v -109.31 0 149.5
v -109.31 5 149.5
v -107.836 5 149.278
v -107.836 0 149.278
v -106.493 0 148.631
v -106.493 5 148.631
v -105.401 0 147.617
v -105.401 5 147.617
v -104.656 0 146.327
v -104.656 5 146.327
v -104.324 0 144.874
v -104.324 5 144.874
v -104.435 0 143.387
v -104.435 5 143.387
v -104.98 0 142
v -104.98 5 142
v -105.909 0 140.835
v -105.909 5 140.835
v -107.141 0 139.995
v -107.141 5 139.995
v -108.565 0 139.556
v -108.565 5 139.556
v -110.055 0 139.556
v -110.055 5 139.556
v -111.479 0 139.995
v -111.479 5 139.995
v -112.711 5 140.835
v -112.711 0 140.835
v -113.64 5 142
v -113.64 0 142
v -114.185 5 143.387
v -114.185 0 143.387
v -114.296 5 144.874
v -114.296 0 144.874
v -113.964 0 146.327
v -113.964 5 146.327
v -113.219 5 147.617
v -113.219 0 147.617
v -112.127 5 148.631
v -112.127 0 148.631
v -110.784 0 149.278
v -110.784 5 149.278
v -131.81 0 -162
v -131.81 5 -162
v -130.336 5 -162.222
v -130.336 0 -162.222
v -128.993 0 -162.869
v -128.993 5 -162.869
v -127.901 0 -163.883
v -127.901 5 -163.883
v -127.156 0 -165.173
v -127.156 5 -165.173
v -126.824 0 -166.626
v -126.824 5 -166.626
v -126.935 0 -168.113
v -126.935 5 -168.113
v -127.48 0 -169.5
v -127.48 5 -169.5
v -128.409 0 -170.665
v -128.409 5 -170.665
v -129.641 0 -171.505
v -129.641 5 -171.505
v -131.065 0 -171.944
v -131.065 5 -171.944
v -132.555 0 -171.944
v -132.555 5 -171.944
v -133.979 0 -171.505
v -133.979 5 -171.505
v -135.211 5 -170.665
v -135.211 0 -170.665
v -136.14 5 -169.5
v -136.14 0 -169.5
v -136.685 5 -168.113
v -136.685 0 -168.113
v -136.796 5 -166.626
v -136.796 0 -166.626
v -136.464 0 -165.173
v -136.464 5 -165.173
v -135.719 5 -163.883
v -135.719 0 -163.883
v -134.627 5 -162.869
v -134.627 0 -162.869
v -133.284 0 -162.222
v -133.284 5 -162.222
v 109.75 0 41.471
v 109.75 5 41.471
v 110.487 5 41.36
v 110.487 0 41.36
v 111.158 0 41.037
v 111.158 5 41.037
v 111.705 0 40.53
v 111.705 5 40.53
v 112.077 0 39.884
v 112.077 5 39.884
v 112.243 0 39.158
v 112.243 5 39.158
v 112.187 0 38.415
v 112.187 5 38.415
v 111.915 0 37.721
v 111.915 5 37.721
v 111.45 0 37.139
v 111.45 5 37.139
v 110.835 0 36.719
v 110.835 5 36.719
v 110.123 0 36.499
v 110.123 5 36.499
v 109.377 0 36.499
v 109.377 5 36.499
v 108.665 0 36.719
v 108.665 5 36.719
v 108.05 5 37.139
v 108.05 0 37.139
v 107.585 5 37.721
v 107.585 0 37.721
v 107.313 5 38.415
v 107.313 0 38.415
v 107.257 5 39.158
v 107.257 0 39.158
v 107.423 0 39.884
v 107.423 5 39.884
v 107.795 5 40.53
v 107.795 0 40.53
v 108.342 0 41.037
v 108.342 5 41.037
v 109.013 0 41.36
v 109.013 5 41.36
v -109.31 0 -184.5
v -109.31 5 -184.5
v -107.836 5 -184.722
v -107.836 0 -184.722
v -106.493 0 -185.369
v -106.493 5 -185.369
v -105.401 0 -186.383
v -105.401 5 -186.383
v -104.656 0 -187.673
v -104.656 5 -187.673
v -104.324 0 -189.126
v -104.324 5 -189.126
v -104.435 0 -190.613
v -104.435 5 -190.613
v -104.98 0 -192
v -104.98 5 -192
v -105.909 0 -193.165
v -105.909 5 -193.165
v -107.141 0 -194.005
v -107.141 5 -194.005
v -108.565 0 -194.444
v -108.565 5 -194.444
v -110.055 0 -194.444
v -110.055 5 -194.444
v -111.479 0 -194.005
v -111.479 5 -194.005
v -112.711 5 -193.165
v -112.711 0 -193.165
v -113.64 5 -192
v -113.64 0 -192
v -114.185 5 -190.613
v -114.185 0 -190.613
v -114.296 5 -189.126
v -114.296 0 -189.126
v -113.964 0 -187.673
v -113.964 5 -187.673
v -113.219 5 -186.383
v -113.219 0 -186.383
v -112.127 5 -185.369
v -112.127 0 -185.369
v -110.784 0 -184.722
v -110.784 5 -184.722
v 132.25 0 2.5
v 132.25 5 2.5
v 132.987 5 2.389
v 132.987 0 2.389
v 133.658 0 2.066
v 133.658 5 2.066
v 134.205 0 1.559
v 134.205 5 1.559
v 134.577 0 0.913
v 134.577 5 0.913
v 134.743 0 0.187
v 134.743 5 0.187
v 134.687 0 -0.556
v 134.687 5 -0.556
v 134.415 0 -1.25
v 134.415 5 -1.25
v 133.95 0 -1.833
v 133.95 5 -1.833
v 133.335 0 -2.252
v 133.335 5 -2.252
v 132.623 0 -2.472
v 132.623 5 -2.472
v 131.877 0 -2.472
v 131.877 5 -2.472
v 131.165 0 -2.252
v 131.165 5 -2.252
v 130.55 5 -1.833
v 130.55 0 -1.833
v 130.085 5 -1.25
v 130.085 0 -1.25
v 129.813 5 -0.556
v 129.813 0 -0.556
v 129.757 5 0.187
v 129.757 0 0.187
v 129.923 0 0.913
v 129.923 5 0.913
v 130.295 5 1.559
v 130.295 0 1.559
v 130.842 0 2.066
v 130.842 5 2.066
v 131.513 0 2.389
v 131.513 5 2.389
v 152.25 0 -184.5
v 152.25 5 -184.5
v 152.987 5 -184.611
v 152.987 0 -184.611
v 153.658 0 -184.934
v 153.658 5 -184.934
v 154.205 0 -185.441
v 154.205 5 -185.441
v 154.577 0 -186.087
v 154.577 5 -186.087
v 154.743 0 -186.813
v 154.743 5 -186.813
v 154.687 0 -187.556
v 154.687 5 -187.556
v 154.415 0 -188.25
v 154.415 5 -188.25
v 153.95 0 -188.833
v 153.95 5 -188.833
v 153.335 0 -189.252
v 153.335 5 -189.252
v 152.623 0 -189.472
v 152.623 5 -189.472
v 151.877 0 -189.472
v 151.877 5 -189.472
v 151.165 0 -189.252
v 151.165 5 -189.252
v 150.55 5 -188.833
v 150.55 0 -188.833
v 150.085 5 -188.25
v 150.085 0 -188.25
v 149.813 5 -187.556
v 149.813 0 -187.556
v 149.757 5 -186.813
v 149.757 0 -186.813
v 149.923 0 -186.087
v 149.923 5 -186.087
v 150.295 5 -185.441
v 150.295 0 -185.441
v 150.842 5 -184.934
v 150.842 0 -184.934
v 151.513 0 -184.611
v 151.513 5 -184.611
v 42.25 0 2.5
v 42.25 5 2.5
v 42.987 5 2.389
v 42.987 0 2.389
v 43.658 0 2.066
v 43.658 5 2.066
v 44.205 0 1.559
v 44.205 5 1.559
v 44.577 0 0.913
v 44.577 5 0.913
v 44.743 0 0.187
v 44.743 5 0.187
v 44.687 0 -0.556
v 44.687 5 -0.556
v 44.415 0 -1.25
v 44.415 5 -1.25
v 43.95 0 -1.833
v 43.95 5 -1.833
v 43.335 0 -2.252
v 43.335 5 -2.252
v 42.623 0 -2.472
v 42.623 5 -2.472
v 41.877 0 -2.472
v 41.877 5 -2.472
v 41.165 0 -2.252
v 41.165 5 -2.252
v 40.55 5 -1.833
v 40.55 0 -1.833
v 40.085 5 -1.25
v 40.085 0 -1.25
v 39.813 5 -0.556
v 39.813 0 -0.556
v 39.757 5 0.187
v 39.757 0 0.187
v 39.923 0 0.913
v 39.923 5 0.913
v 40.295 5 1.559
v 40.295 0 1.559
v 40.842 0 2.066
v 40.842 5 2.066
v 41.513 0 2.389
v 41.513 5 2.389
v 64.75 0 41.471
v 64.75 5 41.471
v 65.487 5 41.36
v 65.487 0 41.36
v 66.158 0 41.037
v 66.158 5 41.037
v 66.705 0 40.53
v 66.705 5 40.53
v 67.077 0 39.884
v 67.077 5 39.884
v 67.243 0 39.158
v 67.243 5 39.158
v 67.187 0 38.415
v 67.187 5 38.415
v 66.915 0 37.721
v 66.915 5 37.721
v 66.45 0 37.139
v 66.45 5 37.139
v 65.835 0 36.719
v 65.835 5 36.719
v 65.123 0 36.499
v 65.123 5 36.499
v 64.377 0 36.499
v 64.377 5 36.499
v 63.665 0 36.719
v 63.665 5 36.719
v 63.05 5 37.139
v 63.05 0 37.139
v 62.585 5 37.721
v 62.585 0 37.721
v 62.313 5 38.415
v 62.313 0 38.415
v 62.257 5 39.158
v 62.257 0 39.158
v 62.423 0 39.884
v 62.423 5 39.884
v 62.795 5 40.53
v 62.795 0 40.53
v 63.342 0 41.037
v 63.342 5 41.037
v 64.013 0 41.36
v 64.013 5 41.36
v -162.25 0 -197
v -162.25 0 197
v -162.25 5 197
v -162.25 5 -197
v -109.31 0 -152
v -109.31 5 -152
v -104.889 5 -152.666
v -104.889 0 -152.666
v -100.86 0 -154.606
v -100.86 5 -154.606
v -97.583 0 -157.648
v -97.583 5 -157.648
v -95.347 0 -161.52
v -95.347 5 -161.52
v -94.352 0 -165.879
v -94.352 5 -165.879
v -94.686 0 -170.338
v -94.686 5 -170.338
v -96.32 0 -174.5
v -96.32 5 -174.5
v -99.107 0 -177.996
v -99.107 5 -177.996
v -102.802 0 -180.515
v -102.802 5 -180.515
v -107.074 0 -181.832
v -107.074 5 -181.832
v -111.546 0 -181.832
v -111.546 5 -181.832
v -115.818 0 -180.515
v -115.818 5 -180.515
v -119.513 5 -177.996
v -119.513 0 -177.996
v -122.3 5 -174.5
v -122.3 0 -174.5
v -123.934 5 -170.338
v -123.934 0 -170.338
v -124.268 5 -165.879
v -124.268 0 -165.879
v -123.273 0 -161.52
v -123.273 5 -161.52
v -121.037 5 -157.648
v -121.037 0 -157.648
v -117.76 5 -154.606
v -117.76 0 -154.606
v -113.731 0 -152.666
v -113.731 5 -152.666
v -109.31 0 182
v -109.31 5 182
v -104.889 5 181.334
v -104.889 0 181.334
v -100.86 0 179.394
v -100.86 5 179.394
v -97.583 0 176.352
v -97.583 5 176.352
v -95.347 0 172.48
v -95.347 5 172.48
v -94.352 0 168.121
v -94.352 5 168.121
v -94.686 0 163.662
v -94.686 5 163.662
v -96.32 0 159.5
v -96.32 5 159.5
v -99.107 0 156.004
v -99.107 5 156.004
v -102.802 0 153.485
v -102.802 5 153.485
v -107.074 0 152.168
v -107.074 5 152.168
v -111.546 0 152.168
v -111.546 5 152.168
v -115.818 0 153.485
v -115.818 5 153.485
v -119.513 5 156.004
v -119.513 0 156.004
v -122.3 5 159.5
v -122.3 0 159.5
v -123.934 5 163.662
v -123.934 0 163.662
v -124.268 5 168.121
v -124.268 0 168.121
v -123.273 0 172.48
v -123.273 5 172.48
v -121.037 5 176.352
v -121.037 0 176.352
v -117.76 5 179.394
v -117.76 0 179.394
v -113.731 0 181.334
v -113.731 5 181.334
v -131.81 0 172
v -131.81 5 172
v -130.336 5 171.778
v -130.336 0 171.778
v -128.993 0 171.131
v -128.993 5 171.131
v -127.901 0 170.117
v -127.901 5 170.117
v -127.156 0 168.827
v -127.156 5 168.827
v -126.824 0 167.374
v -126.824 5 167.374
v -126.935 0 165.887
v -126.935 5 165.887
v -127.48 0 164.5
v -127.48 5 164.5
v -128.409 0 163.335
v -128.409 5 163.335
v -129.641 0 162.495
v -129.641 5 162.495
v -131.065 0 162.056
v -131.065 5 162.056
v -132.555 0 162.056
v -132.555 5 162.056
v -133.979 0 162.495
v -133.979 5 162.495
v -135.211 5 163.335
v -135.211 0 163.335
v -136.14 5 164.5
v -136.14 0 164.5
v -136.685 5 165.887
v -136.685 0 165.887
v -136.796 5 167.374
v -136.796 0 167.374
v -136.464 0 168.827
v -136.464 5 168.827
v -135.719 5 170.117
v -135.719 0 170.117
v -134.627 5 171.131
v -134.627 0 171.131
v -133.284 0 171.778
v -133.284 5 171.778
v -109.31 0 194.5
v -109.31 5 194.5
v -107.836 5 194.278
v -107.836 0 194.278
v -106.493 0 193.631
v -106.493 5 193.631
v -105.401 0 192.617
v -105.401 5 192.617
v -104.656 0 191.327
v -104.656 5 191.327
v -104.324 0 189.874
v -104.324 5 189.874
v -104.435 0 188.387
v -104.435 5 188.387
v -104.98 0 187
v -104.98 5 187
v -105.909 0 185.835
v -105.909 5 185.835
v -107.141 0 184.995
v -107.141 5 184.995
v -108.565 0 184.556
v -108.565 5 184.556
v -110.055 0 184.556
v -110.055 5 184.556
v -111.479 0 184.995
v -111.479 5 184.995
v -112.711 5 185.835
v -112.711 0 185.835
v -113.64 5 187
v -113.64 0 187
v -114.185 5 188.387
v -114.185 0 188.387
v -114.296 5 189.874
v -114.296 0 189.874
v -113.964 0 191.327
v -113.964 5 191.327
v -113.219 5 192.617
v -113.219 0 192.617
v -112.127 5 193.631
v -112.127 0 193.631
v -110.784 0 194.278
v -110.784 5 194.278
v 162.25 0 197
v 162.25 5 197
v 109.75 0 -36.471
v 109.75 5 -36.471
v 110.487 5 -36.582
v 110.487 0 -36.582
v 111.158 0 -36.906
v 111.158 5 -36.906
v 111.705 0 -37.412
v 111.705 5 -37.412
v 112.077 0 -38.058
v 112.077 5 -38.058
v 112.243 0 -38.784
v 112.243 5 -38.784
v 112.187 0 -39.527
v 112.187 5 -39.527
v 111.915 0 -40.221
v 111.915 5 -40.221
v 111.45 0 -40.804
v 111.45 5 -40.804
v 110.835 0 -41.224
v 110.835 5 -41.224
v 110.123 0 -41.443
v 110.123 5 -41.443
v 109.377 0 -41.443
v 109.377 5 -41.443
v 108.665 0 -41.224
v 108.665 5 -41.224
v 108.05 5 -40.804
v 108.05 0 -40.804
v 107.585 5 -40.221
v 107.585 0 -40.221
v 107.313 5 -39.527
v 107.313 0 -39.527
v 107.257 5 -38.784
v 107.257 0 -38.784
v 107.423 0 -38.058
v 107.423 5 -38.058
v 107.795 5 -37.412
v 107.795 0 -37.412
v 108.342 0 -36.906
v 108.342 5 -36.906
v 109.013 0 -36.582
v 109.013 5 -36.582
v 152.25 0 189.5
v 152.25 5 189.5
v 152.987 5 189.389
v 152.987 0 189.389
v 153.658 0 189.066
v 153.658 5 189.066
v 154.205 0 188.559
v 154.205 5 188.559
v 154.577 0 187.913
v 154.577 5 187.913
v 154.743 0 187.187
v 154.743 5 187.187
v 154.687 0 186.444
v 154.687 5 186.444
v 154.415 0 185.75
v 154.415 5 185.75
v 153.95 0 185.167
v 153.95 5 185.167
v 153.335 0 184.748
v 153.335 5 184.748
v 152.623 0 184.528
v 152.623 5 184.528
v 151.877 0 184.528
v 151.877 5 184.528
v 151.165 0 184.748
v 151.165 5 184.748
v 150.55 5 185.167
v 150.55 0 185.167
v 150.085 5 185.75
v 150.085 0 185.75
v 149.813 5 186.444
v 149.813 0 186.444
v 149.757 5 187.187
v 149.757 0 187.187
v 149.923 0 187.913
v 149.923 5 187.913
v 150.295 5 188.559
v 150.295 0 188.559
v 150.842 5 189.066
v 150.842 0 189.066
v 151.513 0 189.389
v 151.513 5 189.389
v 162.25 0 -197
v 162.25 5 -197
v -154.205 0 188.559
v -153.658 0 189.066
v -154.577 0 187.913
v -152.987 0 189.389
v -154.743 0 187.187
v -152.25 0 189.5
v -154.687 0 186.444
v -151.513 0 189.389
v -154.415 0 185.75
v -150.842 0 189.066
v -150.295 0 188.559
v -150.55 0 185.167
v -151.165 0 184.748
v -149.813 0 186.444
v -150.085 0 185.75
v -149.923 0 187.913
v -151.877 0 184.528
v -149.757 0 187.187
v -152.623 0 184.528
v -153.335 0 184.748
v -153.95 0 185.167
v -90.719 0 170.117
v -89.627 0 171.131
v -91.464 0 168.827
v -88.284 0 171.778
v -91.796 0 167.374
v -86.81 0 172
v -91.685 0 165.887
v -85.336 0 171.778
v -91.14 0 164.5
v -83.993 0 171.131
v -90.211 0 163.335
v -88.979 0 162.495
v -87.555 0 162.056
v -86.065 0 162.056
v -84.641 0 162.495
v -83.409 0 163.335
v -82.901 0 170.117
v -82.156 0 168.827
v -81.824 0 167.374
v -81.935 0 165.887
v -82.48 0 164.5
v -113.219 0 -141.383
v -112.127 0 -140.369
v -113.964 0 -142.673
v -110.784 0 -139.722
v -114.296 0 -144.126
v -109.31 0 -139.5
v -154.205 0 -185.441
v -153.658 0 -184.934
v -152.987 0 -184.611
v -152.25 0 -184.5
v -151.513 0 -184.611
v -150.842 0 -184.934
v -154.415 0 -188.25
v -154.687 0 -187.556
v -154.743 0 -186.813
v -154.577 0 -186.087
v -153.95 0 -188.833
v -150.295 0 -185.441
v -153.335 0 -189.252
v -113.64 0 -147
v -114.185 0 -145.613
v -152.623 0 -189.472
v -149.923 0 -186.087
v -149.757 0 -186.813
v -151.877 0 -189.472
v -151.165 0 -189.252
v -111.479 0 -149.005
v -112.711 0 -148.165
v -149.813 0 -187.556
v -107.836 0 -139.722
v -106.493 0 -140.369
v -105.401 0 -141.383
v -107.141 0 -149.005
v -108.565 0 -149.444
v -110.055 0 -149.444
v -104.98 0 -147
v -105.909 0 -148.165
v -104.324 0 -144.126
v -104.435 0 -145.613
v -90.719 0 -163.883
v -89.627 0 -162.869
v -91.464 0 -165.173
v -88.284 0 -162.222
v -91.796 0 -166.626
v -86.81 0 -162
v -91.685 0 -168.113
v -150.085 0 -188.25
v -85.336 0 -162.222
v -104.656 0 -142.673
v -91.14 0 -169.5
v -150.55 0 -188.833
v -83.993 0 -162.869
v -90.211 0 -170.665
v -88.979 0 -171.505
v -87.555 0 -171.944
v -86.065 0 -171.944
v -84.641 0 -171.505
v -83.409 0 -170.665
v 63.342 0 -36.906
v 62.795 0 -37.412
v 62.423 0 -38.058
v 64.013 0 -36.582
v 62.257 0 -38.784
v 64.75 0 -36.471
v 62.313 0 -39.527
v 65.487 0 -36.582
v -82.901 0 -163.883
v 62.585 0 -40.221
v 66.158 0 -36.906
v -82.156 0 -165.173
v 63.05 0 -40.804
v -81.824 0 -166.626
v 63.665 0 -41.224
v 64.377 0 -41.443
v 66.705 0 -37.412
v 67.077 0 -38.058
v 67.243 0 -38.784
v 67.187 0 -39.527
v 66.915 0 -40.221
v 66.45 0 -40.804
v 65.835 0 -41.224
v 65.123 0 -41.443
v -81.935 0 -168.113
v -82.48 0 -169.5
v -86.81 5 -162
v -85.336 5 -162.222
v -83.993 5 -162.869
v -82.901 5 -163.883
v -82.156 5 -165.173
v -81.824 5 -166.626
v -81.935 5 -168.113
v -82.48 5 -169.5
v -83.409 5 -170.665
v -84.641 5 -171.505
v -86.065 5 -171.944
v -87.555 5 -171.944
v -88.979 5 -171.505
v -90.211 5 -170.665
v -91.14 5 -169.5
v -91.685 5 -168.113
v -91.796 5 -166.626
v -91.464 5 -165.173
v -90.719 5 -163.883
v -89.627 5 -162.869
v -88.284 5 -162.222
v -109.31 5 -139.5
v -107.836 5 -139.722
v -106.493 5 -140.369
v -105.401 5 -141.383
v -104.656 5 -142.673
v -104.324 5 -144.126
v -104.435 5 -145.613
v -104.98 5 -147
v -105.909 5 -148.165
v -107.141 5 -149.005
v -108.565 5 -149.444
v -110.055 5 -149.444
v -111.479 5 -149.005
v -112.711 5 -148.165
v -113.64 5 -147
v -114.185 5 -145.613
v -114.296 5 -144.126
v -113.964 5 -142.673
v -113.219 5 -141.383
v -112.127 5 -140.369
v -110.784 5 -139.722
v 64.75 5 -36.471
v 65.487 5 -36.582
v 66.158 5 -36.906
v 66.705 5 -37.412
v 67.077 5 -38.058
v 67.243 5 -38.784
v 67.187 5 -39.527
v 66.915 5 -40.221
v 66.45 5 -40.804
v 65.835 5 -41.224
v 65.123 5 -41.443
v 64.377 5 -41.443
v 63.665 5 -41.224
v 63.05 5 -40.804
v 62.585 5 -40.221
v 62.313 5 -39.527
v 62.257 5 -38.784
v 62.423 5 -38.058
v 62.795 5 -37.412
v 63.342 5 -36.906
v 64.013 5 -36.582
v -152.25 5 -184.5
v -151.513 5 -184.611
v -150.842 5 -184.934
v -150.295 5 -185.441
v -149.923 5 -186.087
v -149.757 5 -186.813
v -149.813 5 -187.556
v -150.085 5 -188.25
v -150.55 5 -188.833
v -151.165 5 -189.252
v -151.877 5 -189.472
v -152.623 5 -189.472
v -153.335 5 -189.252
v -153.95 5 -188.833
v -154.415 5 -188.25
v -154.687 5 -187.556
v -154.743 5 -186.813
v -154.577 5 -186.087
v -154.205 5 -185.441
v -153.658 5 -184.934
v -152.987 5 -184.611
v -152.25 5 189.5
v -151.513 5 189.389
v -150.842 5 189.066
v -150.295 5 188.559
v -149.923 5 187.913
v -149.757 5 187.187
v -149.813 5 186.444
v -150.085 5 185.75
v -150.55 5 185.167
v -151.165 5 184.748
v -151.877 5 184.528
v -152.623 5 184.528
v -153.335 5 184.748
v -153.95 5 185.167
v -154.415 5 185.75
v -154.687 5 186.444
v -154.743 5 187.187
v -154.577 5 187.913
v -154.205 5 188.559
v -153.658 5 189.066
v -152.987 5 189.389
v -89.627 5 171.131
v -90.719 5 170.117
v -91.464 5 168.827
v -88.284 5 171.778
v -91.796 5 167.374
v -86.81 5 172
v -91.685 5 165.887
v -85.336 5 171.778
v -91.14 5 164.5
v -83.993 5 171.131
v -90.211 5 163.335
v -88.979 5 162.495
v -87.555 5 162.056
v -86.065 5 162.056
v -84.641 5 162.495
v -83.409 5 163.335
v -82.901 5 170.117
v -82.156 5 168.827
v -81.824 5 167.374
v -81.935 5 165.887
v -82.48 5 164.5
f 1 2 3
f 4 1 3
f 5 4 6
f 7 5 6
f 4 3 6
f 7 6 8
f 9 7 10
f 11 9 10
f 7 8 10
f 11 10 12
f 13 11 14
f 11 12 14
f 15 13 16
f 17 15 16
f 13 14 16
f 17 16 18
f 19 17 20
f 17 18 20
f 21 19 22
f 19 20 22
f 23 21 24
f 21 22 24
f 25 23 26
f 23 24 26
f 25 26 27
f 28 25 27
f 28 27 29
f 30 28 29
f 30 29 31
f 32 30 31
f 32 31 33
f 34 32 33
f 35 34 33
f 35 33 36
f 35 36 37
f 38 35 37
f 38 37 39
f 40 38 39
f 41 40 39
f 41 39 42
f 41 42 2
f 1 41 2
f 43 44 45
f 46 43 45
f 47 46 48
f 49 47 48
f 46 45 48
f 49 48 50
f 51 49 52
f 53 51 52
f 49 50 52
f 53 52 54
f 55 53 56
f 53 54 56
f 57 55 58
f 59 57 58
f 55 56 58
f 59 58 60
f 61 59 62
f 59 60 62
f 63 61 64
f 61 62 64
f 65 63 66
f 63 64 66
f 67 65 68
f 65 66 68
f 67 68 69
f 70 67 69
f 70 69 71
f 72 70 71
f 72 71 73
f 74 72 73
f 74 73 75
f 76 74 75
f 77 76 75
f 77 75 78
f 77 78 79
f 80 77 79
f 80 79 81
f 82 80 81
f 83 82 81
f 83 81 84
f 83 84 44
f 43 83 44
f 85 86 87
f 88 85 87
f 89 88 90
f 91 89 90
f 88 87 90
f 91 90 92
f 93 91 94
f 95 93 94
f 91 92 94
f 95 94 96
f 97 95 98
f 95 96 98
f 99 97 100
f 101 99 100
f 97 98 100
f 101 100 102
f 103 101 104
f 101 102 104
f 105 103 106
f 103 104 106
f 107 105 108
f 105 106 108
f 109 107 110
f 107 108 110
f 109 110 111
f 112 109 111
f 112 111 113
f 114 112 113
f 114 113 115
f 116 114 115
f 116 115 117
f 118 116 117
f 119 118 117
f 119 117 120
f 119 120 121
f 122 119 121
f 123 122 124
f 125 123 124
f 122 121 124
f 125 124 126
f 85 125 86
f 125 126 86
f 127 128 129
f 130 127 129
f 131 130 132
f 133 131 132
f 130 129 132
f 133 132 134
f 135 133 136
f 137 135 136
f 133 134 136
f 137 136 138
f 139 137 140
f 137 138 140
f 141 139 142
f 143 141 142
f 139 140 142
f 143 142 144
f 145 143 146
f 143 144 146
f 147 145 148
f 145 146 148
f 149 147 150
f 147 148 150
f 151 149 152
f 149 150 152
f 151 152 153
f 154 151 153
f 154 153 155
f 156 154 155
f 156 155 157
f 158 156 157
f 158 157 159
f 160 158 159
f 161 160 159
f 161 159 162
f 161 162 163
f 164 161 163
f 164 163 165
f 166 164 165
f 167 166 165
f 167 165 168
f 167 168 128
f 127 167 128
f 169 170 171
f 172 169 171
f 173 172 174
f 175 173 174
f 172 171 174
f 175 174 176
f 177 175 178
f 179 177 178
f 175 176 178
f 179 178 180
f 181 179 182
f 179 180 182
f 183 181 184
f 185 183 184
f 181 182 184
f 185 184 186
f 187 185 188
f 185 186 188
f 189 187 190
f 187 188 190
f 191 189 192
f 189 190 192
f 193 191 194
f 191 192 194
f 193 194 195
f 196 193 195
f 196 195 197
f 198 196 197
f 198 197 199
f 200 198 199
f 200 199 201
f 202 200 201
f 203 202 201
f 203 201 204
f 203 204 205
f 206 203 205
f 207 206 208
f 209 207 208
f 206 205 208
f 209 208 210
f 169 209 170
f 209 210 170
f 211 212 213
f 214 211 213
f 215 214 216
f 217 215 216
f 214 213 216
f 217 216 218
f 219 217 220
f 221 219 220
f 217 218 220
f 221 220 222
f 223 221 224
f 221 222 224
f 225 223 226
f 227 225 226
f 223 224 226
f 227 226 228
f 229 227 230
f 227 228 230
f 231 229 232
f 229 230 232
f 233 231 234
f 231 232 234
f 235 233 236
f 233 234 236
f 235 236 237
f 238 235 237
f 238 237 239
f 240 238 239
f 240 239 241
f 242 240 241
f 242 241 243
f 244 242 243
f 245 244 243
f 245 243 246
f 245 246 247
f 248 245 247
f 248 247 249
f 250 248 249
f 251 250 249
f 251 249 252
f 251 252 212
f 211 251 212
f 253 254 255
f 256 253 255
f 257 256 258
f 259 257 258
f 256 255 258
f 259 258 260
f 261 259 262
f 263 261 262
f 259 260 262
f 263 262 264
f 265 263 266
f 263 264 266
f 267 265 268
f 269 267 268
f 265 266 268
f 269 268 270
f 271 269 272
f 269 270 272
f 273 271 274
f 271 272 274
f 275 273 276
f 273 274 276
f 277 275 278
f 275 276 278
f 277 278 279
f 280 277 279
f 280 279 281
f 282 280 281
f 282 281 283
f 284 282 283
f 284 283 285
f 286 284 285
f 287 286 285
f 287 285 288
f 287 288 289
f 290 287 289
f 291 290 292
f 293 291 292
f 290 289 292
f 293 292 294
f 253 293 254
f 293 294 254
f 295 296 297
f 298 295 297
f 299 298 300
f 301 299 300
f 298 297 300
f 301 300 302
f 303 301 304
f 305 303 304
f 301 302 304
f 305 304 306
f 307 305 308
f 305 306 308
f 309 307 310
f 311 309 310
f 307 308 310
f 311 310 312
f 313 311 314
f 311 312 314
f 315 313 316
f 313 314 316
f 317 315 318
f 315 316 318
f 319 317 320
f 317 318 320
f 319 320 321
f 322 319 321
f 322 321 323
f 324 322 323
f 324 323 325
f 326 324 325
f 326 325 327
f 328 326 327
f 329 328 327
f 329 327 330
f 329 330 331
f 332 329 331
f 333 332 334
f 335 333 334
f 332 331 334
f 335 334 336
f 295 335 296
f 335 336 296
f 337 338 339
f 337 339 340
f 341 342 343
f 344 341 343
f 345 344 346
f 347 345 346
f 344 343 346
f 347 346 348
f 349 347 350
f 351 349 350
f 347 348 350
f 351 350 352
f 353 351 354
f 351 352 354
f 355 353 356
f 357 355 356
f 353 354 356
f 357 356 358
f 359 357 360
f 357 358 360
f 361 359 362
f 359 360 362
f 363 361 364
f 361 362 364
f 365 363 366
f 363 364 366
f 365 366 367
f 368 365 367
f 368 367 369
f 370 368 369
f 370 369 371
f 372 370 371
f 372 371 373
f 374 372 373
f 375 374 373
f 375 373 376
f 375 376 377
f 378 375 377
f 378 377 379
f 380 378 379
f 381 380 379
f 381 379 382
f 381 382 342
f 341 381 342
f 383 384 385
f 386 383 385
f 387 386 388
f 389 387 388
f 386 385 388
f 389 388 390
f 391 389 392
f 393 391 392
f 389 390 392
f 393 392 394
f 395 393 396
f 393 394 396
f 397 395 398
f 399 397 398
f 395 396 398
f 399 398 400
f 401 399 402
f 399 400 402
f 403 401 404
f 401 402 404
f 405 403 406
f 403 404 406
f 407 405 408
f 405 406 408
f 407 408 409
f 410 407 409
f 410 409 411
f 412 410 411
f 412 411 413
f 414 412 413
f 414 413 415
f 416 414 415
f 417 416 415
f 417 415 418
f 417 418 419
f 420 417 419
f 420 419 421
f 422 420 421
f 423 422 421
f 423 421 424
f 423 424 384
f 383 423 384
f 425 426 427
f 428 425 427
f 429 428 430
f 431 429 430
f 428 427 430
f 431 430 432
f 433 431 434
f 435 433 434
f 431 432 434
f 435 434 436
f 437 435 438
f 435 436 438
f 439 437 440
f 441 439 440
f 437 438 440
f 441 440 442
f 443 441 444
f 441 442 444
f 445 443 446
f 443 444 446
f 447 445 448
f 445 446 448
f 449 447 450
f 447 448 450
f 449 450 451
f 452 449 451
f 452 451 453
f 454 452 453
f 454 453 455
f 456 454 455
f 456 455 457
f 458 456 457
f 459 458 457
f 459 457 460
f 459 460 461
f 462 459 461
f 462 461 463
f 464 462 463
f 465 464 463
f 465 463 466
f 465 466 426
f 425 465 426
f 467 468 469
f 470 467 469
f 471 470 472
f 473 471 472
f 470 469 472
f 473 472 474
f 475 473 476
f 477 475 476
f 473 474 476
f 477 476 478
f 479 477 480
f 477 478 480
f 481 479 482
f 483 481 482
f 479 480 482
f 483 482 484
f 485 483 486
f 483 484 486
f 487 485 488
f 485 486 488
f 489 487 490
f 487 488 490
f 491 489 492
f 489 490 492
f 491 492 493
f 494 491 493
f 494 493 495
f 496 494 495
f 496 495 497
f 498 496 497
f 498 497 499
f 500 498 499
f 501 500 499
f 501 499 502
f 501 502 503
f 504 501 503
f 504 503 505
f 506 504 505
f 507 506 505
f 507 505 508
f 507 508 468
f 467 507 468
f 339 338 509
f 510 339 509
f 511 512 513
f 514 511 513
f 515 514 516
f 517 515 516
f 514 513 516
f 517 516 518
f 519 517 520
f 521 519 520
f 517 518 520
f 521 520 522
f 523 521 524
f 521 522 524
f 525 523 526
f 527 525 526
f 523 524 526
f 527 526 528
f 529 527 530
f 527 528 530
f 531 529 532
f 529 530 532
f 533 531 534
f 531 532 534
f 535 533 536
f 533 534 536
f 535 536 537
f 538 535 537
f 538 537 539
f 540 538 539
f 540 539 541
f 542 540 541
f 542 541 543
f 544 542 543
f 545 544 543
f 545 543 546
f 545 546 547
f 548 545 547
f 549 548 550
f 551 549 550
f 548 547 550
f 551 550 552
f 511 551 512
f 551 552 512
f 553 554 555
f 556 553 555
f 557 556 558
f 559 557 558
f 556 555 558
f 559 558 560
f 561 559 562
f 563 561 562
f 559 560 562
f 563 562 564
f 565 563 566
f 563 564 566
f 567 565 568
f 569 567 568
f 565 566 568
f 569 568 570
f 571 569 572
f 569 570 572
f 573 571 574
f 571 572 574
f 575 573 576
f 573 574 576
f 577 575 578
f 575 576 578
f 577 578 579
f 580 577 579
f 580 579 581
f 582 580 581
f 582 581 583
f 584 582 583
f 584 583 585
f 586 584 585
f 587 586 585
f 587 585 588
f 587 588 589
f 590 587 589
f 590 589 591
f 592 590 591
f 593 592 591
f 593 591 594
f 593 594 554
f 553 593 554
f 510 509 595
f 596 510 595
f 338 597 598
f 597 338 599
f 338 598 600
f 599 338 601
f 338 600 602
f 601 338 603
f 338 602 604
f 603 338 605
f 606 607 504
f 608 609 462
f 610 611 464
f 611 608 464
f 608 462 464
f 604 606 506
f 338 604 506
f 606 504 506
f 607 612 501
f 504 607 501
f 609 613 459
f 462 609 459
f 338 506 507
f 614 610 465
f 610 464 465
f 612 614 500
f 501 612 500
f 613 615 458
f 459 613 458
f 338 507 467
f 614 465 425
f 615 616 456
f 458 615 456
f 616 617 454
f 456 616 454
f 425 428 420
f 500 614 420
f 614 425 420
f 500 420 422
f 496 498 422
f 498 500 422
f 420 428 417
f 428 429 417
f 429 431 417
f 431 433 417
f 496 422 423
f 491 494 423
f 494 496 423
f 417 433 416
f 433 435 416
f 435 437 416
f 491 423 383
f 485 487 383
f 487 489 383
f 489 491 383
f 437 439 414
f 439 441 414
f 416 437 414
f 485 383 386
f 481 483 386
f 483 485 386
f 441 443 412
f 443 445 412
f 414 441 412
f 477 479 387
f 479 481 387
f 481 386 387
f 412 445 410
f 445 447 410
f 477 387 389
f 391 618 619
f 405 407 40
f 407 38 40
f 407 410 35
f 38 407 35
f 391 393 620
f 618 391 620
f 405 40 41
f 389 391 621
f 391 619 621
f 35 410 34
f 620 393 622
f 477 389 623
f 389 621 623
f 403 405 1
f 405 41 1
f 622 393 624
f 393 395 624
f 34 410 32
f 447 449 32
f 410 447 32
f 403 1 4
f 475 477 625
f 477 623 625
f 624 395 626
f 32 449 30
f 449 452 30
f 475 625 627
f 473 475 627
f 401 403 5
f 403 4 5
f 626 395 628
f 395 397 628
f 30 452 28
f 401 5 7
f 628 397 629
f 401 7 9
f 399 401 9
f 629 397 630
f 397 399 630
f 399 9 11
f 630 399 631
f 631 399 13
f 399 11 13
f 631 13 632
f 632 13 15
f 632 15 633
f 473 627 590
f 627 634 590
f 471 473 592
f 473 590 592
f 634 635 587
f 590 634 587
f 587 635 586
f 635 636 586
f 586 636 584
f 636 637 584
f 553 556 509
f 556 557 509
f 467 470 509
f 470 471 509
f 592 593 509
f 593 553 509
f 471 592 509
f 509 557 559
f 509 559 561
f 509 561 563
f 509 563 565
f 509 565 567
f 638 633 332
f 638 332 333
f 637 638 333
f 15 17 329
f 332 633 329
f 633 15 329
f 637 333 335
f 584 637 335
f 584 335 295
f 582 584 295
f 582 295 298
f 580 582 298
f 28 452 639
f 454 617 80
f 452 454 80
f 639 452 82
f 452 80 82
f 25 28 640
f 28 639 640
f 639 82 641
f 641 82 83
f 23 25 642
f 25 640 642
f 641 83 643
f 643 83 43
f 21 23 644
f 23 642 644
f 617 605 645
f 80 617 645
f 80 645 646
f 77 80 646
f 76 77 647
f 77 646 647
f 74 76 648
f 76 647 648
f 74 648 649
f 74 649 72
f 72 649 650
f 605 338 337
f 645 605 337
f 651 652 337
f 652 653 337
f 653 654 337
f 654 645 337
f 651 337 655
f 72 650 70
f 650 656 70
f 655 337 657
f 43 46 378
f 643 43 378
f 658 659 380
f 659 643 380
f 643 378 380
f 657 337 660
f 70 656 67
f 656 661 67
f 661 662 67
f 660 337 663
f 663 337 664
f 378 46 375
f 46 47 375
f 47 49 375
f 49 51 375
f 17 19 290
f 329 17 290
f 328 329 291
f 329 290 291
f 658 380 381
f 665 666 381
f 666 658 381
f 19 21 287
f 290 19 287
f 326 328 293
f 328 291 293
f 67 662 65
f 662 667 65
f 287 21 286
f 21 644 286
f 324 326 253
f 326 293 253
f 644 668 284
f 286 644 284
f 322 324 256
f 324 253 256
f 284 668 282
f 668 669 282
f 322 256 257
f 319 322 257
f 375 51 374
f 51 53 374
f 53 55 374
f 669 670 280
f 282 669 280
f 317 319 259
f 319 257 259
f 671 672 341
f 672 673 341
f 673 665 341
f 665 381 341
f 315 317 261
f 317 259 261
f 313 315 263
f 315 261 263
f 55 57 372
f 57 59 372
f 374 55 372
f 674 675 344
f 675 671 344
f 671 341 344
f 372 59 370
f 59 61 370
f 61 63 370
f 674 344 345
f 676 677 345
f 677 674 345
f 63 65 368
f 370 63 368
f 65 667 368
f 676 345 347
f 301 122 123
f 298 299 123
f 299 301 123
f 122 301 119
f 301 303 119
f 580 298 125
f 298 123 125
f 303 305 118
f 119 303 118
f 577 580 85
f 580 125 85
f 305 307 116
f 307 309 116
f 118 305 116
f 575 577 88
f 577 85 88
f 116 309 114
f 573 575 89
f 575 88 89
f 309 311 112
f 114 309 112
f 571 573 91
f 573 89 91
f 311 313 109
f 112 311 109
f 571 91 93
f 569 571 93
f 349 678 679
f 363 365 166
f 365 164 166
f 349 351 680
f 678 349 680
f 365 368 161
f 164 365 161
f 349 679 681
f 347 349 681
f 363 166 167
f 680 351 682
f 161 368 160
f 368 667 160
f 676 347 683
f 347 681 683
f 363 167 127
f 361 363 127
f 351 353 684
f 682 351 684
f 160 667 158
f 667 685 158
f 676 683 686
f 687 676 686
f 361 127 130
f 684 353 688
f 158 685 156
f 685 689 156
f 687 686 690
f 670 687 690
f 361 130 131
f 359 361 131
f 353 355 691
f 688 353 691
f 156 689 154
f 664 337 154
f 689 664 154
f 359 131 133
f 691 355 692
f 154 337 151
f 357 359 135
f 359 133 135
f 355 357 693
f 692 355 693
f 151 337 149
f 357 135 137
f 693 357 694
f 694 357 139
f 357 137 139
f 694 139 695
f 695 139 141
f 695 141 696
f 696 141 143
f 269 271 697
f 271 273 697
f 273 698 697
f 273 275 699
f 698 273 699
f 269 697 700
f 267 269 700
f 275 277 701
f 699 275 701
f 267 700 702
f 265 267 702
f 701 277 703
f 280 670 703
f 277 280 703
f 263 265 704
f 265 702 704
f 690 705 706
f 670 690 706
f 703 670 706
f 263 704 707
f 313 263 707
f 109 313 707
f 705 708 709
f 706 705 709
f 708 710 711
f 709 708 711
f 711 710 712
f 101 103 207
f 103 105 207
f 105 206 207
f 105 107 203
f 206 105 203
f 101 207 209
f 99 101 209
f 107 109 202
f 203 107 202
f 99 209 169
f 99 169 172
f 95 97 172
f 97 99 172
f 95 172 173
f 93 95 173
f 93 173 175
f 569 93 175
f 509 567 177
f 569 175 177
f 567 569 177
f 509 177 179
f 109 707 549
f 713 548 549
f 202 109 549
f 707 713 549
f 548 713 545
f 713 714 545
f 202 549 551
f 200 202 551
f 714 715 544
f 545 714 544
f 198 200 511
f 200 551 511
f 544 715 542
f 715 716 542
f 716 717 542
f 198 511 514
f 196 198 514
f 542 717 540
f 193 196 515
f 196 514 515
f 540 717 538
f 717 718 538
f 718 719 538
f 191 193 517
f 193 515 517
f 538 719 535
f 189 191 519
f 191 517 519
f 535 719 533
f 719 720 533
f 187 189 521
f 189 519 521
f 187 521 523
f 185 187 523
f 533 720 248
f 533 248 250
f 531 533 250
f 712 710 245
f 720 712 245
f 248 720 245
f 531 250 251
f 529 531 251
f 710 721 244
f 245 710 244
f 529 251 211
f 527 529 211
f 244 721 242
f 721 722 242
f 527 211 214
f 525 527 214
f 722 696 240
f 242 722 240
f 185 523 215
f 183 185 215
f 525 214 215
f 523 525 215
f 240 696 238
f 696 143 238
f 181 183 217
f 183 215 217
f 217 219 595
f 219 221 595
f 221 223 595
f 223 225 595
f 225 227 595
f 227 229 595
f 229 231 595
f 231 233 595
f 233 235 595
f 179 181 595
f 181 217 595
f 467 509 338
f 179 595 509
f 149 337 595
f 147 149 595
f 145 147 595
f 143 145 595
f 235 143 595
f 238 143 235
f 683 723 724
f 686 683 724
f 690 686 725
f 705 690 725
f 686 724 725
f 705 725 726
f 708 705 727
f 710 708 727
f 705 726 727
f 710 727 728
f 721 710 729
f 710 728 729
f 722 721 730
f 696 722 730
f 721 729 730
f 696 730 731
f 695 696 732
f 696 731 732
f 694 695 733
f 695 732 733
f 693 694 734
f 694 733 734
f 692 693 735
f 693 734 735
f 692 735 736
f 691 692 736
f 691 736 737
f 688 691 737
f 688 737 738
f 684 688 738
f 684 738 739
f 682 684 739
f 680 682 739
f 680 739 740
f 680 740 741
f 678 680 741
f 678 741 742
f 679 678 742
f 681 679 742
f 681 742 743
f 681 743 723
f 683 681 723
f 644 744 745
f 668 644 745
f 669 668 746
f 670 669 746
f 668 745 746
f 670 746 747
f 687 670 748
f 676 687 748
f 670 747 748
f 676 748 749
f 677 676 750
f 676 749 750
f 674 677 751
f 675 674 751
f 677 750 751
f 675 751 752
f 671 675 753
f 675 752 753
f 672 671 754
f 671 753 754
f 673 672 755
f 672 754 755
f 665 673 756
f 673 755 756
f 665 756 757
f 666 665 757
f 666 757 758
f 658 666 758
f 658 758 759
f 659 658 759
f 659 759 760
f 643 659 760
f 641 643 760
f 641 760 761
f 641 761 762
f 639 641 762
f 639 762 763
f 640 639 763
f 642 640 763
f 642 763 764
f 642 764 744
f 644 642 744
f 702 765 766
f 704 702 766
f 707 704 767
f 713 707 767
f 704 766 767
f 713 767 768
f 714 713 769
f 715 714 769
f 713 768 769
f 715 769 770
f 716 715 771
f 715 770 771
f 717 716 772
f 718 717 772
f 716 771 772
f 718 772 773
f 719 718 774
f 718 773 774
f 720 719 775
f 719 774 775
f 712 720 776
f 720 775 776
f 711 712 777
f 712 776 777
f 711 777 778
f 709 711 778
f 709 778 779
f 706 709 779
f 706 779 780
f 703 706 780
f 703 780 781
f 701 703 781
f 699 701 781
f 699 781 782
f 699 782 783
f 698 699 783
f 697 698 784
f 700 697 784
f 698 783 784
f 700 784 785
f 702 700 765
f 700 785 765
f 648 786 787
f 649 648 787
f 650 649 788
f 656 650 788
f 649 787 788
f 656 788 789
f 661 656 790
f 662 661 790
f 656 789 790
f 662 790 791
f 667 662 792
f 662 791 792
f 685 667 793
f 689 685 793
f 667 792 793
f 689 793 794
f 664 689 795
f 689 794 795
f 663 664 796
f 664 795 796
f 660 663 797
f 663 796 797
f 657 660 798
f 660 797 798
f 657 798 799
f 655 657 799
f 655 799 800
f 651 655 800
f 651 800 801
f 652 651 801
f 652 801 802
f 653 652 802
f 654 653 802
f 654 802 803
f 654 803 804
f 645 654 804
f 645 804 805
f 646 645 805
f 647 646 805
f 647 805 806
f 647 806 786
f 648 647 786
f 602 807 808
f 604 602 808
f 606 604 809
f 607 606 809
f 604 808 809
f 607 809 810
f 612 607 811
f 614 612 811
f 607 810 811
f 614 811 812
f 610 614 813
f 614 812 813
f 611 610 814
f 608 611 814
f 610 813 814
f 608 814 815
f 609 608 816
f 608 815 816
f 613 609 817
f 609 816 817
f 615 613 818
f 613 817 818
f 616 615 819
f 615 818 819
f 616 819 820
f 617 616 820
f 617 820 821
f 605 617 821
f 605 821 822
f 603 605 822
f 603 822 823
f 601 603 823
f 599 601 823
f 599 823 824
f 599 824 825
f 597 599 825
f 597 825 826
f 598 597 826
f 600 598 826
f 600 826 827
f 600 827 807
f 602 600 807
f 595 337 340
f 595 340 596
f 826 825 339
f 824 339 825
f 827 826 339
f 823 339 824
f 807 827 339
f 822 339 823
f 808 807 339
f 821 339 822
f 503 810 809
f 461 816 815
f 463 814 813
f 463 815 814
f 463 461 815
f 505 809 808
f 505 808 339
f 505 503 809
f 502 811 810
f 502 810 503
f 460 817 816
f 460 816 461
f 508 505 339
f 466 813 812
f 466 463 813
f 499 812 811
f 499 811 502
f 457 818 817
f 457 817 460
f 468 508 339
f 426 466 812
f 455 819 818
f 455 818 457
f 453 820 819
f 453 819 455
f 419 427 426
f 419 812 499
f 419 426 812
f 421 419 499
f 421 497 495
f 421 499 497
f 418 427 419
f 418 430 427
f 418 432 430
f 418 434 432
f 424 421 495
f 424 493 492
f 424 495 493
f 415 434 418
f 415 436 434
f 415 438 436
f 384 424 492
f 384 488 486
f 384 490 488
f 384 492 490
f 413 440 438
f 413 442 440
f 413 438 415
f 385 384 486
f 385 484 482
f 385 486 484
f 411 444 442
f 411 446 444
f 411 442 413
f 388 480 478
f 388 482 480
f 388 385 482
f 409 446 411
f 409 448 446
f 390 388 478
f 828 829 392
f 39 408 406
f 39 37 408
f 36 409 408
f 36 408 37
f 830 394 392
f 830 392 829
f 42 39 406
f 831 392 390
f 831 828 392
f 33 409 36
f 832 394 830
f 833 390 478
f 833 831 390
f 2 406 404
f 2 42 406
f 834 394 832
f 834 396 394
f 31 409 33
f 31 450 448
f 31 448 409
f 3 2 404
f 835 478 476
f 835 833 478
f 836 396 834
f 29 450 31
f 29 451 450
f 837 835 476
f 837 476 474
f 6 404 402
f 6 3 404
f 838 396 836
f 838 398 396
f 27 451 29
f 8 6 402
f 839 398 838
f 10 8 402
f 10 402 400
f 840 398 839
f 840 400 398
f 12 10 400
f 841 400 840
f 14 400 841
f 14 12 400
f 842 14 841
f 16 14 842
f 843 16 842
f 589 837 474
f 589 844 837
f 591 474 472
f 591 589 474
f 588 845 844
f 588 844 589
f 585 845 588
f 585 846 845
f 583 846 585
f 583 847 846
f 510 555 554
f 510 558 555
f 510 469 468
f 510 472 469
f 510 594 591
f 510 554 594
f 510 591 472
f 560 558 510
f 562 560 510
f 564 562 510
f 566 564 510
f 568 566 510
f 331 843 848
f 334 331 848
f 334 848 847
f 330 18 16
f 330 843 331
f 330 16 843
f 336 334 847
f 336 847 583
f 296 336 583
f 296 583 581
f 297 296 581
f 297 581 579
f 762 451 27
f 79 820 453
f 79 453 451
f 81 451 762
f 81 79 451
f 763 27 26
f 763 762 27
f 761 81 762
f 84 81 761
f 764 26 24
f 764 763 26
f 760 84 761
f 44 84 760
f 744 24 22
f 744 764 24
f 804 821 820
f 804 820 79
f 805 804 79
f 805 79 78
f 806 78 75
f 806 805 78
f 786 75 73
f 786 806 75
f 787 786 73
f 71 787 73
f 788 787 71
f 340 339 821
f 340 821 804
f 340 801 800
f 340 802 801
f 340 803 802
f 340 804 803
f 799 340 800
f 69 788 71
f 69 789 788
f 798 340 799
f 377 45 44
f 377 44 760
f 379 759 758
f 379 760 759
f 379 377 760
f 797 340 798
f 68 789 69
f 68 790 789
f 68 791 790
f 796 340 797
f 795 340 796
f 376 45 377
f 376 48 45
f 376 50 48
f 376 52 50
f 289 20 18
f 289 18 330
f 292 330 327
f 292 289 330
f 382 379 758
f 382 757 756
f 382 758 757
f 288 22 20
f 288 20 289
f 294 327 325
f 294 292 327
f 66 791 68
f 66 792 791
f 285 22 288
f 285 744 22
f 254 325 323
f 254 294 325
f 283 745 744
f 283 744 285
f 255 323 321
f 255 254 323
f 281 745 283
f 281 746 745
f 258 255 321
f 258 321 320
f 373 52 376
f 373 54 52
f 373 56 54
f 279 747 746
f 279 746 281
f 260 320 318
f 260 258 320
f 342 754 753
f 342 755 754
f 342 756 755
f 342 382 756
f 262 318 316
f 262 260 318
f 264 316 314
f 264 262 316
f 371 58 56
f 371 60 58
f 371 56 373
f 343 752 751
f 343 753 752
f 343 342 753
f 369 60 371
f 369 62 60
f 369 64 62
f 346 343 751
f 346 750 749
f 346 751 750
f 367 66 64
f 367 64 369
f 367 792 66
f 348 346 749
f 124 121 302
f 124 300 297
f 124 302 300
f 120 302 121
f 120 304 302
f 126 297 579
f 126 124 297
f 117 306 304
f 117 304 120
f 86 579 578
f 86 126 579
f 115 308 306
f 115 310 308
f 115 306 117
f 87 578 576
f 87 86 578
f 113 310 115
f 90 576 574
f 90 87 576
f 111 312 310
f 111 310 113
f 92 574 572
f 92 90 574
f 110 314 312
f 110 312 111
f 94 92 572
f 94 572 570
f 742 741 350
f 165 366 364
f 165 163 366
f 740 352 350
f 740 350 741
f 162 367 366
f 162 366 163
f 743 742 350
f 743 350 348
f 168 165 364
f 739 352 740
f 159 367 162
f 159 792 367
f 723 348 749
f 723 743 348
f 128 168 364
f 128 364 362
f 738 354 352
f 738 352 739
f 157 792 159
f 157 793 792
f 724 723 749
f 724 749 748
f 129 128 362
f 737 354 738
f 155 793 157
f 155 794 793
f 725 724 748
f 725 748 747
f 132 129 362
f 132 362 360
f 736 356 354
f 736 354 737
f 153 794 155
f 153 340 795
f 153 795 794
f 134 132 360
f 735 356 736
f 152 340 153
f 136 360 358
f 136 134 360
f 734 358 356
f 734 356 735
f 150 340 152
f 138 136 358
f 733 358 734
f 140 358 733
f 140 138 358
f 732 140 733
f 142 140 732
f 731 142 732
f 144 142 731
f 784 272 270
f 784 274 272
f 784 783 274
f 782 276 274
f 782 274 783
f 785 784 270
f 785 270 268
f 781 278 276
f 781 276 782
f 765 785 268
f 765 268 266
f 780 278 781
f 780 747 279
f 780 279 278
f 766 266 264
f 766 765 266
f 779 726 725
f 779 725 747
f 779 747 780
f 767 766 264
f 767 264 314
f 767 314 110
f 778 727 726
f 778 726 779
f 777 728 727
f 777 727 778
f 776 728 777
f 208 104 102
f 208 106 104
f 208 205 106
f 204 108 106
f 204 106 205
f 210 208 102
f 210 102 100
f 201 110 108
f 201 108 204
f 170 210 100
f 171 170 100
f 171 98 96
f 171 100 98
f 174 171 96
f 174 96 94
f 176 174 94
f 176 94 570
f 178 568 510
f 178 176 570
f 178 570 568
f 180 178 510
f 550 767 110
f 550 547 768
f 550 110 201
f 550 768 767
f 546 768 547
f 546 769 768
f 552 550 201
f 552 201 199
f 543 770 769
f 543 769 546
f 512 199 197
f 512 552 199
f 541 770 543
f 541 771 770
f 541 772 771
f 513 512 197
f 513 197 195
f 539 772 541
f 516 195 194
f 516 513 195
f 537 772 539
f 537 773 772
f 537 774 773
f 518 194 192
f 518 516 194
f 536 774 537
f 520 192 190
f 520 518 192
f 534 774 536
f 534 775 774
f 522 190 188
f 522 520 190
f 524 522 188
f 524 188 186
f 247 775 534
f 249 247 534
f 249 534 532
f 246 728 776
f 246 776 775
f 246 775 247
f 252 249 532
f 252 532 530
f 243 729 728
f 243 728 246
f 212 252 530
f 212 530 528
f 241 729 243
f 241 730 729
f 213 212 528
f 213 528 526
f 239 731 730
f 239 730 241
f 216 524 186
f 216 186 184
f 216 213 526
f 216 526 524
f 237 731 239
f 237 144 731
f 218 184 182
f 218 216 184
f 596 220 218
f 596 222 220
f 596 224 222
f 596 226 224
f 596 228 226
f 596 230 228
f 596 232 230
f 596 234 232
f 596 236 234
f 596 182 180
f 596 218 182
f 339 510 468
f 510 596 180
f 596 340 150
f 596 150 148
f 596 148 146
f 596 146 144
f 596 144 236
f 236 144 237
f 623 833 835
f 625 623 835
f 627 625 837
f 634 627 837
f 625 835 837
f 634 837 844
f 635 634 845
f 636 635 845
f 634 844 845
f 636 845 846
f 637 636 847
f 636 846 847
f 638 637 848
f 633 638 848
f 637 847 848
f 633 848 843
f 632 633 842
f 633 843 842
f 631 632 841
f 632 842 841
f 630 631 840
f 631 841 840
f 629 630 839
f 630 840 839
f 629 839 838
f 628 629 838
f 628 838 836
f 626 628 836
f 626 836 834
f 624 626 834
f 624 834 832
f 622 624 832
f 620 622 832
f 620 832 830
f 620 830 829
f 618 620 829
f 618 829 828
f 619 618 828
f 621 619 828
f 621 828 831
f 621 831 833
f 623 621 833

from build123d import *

# Parameters (mm, degrees)
SKETCH1_W           = 324.5
SKETCH1_H           = 394
BOSS_EXTRUDE1_DEPTH = 5
SKETCH2_R           = 2.5
CUT_EXTRUDE1_DEPTH  = 256.262732298
SKETCH3_R           = 2.5
CUT_EXTRUDE2_DEPTH  = 5
SKETCH4_R           = 15
SKETCH4_R_2         = 5
CUT_EXTRUDE4_DEPTH  = 256.262732298


with BuildPart() as part:
    # Sketch1 → Boss-Extrude1 (new body)
    with BuildSketch(Plane(origin=(0, 0, 0), x_dir=(1, 0, 0), z_dir=(0, 1, 0))):
        Rectangle(SKETCH1_W, SKETCH1_H)
    extrude(amount=BOSS_EXTRUDE1_DEPTH)

    # Sketch2 → Cut-Extrude1 (cut, through all)
    with BuildSketch(Plane(origin=(0, 5, 0), x_dir=(1, 0, 0), z_dir=(0, 1, 0))):
        with Locations(Location((152.25, 187, 0), (0, 0, 270))):
            Circle(SKETCH2_R)
        with Locations(Location((-152.25, 187, 0), (0, 0, 270))):
            Circle(SKETCH2_R)
        with Locations(Location((-152.25, -187, 0), (0, 0, 270))):
            Circle(SKETCH2_R)
        with Locations(Location((152.25, -187, 0), (0, 0, 270))):
            Circle(SKETCH2_R)
    extrude(amount=-CUT_EXTRUDE1_DEPTH, mode=Mode.SUBTRACT)

    # Sketch3 → Cut-Extrude2 (cut)
    with BuildSketch(Plane(origin=(0, 5, 0), x_dir=(1, 0, 0), z_dir=(0, 1, 0))):
        with Locations(Location((132.25, 0, 0), (0, 0, 270))):
            Circle(SKETCH3_R)
        with Locations(Location((109.75, -38.97114317, 0), (0, 0, 270))):
            Circle(SKETCH3_R)
        with Locations(Location((64.75, -38.97114317, 0), (0, 0, 270))):
            Circle(SKETCH3_R)
        with Locations(Location((42.25, 0, 0), (0, 0, 270))):
            Circle(SKETCH3_R)
        with Locations(Location((64.75, 38.97114317, 0), (0, 0, 270))):
            Circle(SKETCH3_R)
        with Locations(Location((109.75, 38.97114317, 0), (0, 0, 270))):
            Circle(SKETCH3_R)
    extrude(amount=-CUT_EXTRUDE2_DEPTH, mode=Mode.SUBTRACT)

    # Sketch4 → Cut-Extrude4 (cut, through all)
    with BuildSketch(Plane(origin=(0, 5, 0), x_dir=(1, 0, 0), z_dir=(0, 1, 0))):
        with Locations(Location((-109.31, 167, 0), (0, 0, 270))):
            Circle(SKETCH4_R)
        with Locations(Location((-109.31, -167, 0), (0, 0, 270))):
            Circle(SKETCH4_R)
        with Locations(Location((-109.31, 189.5, 0), (0, 0, 270))):
            Circle(SKETCH4_R_2)
        with Locations(Location((-109.31, -189.5, 0), (0, 0, 270))):
            Circle(SKETCH4_R_2)
        with Locations(Location((-131.81, -167, 0), (0, 0, 270))):
            Circle(SKETCH4_R_2)
        with Locations(Location((-109.31, -144.5, 0), (0, 0, 270))):
            Circle(SKETCH4_R_2)
        with Locations(Location((-86.81, -167, 0), (0, 0, 270))):
            Circle(SKETCH4_R_2)
        with Locations(Location((-86.81, 167, 0), (0, 0, 270))):
            Circle(SKETCH4_R_2)
        with Locations(Location((-109.31, 144.5, 0), (0, 0, 270))):
            Circle(SKETCH4_R_2)
        with Locations(Location((-131.81, 167, 0), (0, 0, 270))):
            Circle(SKETCH4_R_2)
    extrude(amount=-CUT_EXTRUDE4_DEPTH, mode=Mode.SUBTRACT)


solid = part.part
